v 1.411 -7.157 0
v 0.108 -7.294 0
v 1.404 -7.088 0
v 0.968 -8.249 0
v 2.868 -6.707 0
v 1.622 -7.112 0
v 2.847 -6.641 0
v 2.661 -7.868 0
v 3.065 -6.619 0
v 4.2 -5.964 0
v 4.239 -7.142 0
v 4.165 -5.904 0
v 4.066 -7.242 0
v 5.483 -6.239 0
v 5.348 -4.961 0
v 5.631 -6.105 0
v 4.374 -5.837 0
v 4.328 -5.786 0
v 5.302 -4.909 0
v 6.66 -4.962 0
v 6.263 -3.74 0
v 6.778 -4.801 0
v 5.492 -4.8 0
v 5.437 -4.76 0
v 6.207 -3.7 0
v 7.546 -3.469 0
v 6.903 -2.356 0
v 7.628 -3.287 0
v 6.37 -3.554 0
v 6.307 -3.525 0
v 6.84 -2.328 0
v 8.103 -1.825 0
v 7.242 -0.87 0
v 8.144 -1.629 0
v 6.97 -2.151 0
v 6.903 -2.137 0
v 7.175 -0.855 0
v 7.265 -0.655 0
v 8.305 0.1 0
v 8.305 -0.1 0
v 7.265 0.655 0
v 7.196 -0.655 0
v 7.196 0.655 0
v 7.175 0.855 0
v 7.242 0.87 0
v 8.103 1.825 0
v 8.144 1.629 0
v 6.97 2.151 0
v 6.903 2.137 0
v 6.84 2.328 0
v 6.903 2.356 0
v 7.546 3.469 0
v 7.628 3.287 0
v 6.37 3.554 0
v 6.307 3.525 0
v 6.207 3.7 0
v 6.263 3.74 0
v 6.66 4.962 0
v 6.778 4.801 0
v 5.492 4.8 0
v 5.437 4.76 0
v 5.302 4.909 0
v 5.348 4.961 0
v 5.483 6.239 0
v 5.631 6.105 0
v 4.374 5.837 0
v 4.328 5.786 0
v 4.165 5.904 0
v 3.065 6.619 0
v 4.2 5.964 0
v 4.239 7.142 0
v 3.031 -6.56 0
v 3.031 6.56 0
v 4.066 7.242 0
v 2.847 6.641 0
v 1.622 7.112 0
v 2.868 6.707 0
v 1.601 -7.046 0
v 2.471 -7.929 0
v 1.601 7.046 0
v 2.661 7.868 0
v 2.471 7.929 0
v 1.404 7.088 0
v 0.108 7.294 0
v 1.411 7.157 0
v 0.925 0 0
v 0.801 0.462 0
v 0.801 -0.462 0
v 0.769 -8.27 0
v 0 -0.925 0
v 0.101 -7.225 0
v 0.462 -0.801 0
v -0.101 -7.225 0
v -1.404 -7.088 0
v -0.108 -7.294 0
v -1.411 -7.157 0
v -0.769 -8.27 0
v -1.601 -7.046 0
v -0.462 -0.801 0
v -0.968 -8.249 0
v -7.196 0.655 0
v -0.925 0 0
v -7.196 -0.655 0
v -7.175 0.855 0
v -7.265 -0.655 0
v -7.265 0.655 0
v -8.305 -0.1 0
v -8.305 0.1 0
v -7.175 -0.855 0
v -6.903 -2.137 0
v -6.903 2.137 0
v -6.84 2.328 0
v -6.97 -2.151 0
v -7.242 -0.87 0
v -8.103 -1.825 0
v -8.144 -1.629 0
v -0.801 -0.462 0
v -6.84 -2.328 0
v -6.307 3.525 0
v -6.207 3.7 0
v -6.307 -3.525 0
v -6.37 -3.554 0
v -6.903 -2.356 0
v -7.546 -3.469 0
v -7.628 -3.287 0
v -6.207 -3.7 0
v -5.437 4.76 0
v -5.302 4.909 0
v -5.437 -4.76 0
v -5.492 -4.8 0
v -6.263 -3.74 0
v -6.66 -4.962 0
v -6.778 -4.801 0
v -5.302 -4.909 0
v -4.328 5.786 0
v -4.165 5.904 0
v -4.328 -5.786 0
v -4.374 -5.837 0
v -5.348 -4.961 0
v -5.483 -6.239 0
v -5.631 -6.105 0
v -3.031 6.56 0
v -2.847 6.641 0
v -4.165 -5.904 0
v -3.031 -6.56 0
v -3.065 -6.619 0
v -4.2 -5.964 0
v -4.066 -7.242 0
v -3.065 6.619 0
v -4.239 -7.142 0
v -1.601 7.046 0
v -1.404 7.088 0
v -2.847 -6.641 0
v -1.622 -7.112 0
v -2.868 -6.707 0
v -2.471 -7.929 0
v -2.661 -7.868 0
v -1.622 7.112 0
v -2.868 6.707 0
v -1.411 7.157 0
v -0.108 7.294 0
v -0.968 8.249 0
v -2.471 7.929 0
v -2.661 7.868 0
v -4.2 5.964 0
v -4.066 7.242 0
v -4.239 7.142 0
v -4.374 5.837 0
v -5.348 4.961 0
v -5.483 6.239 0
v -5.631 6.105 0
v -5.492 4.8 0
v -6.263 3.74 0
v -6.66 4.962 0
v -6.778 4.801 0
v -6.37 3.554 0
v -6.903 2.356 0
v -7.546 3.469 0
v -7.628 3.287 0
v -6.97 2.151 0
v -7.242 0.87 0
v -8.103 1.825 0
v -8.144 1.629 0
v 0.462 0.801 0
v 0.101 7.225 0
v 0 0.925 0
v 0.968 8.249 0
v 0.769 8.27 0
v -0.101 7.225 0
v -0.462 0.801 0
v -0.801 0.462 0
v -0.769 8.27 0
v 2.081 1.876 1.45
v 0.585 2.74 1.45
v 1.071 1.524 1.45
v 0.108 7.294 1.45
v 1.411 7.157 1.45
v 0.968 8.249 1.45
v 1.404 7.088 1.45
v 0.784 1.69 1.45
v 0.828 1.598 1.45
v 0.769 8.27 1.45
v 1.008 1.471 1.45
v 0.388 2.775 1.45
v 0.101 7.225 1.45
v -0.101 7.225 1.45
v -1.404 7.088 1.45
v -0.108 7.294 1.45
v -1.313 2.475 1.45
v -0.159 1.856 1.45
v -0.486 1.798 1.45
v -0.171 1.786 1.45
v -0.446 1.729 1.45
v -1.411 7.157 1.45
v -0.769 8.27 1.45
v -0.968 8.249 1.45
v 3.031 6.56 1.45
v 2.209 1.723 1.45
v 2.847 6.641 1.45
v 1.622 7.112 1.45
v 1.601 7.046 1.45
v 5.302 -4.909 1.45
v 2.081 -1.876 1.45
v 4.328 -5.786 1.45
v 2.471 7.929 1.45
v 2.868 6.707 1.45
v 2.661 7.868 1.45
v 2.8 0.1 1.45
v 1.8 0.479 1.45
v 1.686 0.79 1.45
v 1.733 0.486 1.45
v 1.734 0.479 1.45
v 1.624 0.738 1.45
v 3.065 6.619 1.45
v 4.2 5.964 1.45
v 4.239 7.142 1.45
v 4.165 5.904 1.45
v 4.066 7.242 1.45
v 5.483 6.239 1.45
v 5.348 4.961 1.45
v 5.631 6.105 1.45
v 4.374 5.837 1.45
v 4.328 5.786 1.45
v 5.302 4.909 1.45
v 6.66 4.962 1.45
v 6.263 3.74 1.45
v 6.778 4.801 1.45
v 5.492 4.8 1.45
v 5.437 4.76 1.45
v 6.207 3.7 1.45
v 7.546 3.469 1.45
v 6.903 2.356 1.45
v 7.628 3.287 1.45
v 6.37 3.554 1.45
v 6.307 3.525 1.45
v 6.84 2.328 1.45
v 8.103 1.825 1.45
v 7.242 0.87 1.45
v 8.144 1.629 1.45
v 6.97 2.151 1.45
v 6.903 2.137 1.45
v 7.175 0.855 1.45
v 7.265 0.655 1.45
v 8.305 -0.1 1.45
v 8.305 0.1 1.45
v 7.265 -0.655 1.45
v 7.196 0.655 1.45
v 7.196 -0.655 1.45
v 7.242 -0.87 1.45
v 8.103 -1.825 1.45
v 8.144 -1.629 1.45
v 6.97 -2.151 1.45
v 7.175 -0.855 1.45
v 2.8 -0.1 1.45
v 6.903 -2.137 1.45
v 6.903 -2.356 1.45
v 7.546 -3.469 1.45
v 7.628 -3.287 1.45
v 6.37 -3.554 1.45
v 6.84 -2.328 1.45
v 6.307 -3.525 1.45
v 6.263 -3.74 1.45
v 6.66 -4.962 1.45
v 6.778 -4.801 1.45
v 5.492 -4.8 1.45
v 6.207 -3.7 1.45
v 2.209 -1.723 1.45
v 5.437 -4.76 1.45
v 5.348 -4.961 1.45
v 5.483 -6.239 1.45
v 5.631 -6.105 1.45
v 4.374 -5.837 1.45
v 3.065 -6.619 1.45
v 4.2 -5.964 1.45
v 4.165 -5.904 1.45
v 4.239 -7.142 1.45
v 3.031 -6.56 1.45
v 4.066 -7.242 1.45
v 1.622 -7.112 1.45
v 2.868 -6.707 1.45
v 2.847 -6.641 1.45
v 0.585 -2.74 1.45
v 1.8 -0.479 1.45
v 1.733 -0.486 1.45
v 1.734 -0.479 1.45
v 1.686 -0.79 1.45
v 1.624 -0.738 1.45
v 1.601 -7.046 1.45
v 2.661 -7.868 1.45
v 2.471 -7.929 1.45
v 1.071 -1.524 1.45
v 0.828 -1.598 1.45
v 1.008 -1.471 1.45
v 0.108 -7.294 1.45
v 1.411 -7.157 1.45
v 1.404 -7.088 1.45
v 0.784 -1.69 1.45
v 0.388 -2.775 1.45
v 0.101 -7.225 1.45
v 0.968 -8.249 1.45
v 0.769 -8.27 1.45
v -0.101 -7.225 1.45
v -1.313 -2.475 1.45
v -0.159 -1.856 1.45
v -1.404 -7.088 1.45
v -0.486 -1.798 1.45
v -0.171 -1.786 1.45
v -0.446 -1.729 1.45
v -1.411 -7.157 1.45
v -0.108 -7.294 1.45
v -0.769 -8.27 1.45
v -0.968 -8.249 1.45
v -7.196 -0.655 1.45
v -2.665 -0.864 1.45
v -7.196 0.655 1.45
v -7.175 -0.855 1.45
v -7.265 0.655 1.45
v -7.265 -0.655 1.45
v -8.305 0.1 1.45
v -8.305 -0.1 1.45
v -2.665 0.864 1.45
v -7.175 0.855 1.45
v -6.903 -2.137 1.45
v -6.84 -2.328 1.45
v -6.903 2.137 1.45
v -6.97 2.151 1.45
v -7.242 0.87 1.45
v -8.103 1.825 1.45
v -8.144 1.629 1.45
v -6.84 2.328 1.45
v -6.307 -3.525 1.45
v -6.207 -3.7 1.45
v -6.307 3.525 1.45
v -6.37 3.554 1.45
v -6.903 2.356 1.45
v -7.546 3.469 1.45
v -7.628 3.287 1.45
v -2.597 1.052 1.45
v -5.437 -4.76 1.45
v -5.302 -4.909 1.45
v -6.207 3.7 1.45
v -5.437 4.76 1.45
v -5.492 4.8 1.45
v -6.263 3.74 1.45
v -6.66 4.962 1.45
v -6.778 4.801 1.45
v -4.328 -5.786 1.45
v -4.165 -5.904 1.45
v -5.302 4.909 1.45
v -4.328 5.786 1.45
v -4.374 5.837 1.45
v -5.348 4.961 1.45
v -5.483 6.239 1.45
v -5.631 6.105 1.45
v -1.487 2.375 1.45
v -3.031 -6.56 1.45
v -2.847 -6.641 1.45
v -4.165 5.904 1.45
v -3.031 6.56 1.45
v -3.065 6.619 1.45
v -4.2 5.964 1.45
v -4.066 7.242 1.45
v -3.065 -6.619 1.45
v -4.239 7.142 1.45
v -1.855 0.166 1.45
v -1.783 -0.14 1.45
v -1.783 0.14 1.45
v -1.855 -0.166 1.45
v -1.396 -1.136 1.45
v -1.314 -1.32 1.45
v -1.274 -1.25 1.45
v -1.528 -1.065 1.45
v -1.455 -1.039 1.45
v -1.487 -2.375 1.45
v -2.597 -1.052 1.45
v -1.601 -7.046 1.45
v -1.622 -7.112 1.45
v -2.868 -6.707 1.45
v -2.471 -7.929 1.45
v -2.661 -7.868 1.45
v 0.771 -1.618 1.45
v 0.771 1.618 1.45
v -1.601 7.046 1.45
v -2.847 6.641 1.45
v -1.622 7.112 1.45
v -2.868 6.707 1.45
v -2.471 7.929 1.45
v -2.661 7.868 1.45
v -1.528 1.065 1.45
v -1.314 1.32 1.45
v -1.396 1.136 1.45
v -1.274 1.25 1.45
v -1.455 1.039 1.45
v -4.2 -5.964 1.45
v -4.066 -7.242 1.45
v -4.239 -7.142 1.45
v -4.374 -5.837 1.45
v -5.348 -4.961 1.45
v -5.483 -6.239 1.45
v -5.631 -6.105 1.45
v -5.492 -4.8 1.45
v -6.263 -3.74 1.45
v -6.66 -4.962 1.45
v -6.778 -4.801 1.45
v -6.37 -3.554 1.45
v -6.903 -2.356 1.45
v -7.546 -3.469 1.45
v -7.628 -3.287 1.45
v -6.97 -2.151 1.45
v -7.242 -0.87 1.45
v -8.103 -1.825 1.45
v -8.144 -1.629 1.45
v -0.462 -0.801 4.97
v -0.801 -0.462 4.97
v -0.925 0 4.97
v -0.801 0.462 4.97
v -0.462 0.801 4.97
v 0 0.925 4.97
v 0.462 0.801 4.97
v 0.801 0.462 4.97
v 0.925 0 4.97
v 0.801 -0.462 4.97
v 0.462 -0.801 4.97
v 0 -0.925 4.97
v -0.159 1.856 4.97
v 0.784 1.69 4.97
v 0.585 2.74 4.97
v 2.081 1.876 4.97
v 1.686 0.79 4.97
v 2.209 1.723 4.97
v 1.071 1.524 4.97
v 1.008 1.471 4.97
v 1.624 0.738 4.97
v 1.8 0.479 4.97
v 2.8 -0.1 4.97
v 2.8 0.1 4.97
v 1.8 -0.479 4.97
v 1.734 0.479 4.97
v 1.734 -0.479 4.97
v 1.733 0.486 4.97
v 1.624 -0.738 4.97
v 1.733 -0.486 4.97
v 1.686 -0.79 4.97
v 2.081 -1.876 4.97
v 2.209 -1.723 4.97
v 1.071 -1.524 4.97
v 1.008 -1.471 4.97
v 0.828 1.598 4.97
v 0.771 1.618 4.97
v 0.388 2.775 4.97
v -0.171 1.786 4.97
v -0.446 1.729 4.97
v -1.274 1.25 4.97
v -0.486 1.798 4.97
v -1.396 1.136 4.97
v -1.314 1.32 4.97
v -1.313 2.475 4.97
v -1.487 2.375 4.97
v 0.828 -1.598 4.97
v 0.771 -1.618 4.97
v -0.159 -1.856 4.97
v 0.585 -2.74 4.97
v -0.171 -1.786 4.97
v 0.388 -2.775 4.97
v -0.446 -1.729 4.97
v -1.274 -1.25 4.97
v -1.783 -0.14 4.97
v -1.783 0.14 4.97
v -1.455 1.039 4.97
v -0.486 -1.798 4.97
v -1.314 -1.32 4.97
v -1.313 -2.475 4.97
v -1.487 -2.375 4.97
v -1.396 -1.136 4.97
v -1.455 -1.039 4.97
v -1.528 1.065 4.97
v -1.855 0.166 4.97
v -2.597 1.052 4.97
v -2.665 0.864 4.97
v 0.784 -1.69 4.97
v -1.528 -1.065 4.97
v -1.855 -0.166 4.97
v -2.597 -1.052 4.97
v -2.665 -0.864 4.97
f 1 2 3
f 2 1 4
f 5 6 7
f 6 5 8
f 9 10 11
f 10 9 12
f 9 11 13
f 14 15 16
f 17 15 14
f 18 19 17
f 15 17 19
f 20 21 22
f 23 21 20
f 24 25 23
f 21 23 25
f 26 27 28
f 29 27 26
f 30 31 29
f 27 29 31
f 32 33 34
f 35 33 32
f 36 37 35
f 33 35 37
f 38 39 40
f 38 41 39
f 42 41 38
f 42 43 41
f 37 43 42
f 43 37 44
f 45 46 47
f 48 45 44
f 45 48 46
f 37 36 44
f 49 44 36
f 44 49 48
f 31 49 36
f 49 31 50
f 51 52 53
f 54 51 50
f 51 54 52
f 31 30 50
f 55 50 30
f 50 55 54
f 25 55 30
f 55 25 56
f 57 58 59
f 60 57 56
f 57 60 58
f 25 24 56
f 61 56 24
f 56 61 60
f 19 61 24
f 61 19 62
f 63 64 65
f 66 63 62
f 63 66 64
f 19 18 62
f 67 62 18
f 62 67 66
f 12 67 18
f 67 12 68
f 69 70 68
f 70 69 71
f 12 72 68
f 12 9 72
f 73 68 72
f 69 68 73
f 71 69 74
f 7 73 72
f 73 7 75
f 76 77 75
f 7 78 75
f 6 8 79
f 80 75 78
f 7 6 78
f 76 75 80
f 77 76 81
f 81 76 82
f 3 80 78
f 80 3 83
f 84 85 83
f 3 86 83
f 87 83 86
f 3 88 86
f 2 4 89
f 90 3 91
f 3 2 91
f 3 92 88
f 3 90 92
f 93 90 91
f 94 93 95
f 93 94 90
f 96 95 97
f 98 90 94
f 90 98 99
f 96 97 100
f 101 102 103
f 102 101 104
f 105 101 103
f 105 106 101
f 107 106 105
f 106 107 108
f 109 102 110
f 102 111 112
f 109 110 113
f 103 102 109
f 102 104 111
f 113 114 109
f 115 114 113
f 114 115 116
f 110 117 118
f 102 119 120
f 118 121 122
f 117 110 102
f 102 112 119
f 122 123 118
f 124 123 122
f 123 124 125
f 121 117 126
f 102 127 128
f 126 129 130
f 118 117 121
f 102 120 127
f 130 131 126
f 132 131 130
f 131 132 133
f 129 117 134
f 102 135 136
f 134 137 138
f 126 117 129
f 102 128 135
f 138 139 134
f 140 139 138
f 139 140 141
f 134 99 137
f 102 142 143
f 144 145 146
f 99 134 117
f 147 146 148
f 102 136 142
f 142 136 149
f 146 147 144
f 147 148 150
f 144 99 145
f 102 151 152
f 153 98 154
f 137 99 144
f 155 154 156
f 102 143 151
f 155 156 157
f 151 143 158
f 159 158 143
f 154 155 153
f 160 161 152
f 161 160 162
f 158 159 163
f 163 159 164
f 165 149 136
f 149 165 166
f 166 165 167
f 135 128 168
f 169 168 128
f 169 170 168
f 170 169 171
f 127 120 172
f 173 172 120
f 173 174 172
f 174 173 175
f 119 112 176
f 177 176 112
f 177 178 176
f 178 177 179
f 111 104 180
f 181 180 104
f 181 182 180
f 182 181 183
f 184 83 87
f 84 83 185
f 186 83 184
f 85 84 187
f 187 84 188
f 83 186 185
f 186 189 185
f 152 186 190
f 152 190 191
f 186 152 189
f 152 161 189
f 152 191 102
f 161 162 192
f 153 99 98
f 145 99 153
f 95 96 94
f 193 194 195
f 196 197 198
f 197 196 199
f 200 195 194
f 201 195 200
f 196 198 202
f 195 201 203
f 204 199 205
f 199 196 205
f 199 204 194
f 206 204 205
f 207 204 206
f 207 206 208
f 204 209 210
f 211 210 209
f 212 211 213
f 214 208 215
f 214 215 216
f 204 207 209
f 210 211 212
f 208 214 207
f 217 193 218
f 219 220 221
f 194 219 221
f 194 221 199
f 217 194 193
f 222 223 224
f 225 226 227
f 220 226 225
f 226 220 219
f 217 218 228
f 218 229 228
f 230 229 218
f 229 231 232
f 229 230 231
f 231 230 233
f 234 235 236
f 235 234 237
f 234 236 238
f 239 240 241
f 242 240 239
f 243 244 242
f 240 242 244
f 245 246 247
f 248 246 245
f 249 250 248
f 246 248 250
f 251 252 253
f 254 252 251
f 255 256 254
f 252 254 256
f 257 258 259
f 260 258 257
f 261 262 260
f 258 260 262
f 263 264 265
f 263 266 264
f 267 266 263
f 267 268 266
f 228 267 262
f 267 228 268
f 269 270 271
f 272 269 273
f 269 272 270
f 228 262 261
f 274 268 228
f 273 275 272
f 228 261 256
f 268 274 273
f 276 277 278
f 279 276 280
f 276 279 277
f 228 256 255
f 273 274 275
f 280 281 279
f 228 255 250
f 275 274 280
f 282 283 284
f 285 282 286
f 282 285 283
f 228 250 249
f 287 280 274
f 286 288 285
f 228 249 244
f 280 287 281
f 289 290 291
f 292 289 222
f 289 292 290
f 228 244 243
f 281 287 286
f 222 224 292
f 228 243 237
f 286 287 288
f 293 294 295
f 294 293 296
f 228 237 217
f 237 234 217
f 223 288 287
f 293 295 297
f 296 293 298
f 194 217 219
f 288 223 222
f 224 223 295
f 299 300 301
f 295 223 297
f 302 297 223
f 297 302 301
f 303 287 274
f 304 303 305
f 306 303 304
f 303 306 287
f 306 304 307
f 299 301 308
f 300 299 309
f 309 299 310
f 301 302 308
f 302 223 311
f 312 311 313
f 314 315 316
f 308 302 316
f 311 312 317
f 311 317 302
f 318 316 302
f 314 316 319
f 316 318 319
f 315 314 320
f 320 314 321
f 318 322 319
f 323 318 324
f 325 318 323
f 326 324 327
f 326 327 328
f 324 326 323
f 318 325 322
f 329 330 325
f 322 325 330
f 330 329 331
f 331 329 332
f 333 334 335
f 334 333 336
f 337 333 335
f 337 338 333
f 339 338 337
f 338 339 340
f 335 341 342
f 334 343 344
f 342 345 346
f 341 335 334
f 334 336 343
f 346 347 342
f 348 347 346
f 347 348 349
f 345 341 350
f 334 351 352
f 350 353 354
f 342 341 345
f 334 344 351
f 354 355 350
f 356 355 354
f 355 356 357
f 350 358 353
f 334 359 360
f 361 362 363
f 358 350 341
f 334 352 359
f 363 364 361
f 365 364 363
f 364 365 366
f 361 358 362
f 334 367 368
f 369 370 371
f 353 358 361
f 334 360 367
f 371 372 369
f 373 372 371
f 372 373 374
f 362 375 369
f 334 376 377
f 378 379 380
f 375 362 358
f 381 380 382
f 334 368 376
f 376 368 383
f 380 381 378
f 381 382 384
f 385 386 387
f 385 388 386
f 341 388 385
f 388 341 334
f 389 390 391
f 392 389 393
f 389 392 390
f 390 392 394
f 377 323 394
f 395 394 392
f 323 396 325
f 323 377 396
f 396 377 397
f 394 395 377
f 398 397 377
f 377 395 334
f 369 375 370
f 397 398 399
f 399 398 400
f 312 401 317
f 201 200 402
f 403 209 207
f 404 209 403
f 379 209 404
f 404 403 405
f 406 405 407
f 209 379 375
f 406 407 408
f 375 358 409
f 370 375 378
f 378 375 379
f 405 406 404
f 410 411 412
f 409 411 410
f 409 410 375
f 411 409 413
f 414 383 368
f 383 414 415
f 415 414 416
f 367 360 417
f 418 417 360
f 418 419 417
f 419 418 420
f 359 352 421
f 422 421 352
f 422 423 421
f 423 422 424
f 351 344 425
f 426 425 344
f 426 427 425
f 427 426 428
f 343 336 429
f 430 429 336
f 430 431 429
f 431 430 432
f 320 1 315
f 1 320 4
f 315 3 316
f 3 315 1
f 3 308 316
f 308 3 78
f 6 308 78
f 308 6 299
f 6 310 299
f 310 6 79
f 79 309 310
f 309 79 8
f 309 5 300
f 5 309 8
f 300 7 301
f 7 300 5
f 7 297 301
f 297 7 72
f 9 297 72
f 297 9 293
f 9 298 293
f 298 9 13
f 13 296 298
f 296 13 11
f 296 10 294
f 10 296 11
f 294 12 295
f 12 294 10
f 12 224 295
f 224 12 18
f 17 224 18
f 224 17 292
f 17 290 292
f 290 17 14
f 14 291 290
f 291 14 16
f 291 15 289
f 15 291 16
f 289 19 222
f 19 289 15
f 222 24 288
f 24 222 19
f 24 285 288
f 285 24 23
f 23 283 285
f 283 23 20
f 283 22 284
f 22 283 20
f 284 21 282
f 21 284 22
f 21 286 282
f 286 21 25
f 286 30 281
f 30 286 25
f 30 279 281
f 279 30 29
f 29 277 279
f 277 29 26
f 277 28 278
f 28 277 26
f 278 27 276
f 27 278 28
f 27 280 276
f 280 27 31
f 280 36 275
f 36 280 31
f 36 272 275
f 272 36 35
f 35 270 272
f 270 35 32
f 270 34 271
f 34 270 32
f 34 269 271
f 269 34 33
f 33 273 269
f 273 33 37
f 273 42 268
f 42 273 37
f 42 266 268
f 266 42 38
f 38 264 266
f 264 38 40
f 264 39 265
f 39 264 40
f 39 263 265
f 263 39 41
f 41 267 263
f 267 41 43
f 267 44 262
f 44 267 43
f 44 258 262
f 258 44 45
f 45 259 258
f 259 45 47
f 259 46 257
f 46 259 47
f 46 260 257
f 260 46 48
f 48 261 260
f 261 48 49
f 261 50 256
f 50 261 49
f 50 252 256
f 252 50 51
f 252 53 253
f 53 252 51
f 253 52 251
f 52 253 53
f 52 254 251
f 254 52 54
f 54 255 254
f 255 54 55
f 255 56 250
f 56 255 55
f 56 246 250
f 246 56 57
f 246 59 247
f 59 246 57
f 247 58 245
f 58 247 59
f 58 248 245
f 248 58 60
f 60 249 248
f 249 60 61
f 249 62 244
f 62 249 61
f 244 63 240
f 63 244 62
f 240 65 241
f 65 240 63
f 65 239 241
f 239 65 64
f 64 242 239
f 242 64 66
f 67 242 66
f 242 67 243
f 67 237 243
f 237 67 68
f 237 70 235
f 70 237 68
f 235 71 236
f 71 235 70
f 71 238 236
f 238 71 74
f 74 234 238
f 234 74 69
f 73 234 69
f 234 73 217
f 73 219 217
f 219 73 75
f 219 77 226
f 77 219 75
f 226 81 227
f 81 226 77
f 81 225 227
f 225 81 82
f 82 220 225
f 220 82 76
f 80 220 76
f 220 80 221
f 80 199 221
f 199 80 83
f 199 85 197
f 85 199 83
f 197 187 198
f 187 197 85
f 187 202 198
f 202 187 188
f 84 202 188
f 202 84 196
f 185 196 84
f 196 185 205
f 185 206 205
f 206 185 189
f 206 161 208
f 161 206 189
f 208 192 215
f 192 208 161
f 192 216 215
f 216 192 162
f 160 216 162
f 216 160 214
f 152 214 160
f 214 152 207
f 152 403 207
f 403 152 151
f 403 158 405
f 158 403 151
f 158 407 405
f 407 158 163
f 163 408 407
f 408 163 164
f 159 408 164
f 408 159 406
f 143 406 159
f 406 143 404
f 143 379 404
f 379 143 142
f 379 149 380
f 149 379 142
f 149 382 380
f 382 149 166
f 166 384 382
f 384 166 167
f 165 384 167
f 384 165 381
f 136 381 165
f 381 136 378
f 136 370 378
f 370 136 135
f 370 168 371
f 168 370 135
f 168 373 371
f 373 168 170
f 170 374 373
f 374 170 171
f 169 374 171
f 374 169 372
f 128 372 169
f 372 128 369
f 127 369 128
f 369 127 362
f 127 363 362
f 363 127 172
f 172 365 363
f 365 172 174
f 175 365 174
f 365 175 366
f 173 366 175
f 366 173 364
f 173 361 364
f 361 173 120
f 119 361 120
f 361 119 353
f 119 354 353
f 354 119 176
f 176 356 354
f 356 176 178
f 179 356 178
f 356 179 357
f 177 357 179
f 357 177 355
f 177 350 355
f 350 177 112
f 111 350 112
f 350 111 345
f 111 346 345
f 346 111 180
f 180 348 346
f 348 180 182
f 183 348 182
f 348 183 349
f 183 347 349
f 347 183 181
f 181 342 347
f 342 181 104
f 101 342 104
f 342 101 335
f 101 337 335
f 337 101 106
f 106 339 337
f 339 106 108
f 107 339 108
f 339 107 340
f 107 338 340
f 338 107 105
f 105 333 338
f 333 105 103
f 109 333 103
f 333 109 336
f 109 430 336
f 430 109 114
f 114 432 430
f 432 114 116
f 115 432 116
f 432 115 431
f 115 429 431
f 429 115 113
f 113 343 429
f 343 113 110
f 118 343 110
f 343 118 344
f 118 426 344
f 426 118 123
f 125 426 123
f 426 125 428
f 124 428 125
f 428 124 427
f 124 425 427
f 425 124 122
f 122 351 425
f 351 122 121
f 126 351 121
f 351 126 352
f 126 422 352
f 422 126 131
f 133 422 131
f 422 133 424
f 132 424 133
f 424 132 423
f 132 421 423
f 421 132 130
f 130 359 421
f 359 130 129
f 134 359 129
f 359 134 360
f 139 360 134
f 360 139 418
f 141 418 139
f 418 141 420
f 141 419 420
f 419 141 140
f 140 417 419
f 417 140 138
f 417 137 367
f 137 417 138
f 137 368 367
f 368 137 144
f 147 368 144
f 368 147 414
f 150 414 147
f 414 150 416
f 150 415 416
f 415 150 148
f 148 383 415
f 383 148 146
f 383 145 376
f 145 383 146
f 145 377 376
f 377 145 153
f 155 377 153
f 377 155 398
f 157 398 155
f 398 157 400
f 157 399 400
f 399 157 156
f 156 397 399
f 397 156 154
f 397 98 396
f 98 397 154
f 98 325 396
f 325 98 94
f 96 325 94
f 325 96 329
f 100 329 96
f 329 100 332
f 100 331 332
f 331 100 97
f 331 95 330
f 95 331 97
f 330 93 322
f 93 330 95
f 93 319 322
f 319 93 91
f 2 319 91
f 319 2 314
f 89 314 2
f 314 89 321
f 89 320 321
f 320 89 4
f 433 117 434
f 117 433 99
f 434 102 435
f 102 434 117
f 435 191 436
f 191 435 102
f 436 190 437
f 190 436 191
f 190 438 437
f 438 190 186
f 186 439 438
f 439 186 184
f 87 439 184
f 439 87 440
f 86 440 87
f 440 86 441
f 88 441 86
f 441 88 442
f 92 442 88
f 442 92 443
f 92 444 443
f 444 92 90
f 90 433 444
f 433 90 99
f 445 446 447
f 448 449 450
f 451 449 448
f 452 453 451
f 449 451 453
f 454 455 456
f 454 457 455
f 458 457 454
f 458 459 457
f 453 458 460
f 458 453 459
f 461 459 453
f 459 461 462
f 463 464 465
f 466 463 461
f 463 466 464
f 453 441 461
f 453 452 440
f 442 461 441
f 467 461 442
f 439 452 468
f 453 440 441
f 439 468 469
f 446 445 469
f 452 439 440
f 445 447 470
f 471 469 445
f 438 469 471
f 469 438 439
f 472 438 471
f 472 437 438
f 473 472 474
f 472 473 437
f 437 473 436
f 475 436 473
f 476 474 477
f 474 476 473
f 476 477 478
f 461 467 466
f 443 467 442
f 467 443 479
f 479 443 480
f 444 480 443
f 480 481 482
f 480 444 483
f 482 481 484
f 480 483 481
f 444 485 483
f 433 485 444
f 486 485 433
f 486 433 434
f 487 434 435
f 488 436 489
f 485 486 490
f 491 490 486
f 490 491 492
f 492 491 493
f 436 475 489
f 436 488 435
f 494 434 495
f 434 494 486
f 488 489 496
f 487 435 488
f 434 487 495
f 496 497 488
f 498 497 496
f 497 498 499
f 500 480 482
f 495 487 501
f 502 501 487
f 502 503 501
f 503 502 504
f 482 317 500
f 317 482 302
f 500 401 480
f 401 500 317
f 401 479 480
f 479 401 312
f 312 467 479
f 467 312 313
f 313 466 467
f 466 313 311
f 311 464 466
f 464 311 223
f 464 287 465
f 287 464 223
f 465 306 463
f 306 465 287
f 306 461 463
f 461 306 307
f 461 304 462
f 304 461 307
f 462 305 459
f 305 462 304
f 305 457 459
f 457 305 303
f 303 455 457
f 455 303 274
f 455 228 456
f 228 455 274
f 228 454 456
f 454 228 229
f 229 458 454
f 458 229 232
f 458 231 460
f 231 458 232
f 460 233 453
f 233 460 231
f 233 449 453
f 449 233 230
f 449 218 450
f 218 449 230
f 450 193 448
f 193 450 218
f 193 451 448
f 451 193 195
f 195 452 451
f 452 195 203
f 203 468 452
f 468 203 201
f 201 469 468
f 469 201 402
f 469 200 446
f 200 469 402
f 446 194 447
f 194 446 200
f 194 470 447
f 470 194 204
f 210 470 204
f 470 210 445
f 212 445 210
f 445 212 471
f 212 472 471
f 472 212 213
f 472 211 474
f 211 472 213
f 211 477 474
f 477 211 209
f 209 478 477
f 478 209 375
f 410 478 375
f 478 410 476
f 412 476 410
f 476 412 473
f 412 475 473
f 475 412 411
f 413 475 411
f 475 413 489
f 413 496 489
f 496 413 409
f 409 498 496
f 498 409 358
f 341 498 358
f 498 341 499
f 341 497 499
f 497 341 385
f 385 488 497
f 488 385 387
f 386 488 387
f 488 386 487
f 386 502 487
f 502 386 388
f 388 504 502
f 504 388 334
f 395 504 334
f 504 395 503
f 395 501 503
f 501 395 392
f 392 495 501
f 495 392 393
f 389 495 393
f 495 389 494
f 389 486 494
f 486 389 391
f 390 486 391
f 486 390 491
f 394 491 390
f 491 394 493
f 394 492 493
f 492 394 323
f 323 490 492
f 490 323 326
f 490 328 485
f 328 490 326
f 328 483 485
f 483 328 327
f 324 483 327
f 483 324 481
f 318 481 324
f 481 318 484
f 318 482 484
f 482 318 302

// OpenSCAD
numberOfTheetOfLargeWheel = 30;
innerRadiusOfLargeWheel=7.265; 
outerRadiusOfLargeWheel=8.305;
topLandWidthOfLargeWheel=0.2;
spaceWidthOfLargeWheel=0.2;
depthOfLargeWheel=1.45;
cutoutRadius=0.925;

numberOfTheetOfInnerWheel = 9;
innerRadiusOfInnerWheel=1.8; 
outerRadiusOfInnerWheel=2.8;
topLandWidthOfInnerWheel=0.2;
spaceWidthOfInnerWheel=0.2;
depthOfInnerWheel=4.97;


module oneTooth(pos,angle,r, r2, circularThickness, spaceWidth) {
	translate(pos){
		rotate(a = angle) {
			polygon(points=[[0,-circularThickness/2],[r,-circularThickness/2],[r2,-spaceWidth/2],[r2,spaceWidth/2],[r,circularThickness/2],[0,circularThickness/2]]);
		}
	}
}

module cogwheel(numTeeth, r, r2, topLandWidth, spaceWidth, depth, cutout_radius) {
	circularThickness=r*sin(360/numTeeth)-topLandWidth;
	$fs = 0.5;
	linear_extrude(depth){
		difference() {
			union(){
				circle(r);
				for(i = [0:numTeeth-1]) {
					oneTooth([0,0,0],(360*i/numTeeth), r, r2, circularThickness, spaceWidth);
				}
			}
			circle(cutout_radius);
		}
	}
}

cogwheel(numTeeth=numberOfTheetOfLargeWheel, r=innerRadiusOfLargeWheel, r2=outerRadiusOfLargeWheel, topLandWidth=topLandWidthOfLargeWheel, spaceWidth=spaceWidthOfLargeWheel, depth=depthOfLargeWheel, cutout_radius=cutoutRadius);

cogwheel(numTeeth=numberOfTheetOfInnerWheel, r=innerRadiusOfInnerWheel, r2=outerRadiusOfInnerWheel, topLandWidth=topLandWidthOfInnerWheel, spaceWidth=spaceWidthOfInnerWheel, depth=depthOfInnerWheel, cutout_radius=cutoutRadius);
